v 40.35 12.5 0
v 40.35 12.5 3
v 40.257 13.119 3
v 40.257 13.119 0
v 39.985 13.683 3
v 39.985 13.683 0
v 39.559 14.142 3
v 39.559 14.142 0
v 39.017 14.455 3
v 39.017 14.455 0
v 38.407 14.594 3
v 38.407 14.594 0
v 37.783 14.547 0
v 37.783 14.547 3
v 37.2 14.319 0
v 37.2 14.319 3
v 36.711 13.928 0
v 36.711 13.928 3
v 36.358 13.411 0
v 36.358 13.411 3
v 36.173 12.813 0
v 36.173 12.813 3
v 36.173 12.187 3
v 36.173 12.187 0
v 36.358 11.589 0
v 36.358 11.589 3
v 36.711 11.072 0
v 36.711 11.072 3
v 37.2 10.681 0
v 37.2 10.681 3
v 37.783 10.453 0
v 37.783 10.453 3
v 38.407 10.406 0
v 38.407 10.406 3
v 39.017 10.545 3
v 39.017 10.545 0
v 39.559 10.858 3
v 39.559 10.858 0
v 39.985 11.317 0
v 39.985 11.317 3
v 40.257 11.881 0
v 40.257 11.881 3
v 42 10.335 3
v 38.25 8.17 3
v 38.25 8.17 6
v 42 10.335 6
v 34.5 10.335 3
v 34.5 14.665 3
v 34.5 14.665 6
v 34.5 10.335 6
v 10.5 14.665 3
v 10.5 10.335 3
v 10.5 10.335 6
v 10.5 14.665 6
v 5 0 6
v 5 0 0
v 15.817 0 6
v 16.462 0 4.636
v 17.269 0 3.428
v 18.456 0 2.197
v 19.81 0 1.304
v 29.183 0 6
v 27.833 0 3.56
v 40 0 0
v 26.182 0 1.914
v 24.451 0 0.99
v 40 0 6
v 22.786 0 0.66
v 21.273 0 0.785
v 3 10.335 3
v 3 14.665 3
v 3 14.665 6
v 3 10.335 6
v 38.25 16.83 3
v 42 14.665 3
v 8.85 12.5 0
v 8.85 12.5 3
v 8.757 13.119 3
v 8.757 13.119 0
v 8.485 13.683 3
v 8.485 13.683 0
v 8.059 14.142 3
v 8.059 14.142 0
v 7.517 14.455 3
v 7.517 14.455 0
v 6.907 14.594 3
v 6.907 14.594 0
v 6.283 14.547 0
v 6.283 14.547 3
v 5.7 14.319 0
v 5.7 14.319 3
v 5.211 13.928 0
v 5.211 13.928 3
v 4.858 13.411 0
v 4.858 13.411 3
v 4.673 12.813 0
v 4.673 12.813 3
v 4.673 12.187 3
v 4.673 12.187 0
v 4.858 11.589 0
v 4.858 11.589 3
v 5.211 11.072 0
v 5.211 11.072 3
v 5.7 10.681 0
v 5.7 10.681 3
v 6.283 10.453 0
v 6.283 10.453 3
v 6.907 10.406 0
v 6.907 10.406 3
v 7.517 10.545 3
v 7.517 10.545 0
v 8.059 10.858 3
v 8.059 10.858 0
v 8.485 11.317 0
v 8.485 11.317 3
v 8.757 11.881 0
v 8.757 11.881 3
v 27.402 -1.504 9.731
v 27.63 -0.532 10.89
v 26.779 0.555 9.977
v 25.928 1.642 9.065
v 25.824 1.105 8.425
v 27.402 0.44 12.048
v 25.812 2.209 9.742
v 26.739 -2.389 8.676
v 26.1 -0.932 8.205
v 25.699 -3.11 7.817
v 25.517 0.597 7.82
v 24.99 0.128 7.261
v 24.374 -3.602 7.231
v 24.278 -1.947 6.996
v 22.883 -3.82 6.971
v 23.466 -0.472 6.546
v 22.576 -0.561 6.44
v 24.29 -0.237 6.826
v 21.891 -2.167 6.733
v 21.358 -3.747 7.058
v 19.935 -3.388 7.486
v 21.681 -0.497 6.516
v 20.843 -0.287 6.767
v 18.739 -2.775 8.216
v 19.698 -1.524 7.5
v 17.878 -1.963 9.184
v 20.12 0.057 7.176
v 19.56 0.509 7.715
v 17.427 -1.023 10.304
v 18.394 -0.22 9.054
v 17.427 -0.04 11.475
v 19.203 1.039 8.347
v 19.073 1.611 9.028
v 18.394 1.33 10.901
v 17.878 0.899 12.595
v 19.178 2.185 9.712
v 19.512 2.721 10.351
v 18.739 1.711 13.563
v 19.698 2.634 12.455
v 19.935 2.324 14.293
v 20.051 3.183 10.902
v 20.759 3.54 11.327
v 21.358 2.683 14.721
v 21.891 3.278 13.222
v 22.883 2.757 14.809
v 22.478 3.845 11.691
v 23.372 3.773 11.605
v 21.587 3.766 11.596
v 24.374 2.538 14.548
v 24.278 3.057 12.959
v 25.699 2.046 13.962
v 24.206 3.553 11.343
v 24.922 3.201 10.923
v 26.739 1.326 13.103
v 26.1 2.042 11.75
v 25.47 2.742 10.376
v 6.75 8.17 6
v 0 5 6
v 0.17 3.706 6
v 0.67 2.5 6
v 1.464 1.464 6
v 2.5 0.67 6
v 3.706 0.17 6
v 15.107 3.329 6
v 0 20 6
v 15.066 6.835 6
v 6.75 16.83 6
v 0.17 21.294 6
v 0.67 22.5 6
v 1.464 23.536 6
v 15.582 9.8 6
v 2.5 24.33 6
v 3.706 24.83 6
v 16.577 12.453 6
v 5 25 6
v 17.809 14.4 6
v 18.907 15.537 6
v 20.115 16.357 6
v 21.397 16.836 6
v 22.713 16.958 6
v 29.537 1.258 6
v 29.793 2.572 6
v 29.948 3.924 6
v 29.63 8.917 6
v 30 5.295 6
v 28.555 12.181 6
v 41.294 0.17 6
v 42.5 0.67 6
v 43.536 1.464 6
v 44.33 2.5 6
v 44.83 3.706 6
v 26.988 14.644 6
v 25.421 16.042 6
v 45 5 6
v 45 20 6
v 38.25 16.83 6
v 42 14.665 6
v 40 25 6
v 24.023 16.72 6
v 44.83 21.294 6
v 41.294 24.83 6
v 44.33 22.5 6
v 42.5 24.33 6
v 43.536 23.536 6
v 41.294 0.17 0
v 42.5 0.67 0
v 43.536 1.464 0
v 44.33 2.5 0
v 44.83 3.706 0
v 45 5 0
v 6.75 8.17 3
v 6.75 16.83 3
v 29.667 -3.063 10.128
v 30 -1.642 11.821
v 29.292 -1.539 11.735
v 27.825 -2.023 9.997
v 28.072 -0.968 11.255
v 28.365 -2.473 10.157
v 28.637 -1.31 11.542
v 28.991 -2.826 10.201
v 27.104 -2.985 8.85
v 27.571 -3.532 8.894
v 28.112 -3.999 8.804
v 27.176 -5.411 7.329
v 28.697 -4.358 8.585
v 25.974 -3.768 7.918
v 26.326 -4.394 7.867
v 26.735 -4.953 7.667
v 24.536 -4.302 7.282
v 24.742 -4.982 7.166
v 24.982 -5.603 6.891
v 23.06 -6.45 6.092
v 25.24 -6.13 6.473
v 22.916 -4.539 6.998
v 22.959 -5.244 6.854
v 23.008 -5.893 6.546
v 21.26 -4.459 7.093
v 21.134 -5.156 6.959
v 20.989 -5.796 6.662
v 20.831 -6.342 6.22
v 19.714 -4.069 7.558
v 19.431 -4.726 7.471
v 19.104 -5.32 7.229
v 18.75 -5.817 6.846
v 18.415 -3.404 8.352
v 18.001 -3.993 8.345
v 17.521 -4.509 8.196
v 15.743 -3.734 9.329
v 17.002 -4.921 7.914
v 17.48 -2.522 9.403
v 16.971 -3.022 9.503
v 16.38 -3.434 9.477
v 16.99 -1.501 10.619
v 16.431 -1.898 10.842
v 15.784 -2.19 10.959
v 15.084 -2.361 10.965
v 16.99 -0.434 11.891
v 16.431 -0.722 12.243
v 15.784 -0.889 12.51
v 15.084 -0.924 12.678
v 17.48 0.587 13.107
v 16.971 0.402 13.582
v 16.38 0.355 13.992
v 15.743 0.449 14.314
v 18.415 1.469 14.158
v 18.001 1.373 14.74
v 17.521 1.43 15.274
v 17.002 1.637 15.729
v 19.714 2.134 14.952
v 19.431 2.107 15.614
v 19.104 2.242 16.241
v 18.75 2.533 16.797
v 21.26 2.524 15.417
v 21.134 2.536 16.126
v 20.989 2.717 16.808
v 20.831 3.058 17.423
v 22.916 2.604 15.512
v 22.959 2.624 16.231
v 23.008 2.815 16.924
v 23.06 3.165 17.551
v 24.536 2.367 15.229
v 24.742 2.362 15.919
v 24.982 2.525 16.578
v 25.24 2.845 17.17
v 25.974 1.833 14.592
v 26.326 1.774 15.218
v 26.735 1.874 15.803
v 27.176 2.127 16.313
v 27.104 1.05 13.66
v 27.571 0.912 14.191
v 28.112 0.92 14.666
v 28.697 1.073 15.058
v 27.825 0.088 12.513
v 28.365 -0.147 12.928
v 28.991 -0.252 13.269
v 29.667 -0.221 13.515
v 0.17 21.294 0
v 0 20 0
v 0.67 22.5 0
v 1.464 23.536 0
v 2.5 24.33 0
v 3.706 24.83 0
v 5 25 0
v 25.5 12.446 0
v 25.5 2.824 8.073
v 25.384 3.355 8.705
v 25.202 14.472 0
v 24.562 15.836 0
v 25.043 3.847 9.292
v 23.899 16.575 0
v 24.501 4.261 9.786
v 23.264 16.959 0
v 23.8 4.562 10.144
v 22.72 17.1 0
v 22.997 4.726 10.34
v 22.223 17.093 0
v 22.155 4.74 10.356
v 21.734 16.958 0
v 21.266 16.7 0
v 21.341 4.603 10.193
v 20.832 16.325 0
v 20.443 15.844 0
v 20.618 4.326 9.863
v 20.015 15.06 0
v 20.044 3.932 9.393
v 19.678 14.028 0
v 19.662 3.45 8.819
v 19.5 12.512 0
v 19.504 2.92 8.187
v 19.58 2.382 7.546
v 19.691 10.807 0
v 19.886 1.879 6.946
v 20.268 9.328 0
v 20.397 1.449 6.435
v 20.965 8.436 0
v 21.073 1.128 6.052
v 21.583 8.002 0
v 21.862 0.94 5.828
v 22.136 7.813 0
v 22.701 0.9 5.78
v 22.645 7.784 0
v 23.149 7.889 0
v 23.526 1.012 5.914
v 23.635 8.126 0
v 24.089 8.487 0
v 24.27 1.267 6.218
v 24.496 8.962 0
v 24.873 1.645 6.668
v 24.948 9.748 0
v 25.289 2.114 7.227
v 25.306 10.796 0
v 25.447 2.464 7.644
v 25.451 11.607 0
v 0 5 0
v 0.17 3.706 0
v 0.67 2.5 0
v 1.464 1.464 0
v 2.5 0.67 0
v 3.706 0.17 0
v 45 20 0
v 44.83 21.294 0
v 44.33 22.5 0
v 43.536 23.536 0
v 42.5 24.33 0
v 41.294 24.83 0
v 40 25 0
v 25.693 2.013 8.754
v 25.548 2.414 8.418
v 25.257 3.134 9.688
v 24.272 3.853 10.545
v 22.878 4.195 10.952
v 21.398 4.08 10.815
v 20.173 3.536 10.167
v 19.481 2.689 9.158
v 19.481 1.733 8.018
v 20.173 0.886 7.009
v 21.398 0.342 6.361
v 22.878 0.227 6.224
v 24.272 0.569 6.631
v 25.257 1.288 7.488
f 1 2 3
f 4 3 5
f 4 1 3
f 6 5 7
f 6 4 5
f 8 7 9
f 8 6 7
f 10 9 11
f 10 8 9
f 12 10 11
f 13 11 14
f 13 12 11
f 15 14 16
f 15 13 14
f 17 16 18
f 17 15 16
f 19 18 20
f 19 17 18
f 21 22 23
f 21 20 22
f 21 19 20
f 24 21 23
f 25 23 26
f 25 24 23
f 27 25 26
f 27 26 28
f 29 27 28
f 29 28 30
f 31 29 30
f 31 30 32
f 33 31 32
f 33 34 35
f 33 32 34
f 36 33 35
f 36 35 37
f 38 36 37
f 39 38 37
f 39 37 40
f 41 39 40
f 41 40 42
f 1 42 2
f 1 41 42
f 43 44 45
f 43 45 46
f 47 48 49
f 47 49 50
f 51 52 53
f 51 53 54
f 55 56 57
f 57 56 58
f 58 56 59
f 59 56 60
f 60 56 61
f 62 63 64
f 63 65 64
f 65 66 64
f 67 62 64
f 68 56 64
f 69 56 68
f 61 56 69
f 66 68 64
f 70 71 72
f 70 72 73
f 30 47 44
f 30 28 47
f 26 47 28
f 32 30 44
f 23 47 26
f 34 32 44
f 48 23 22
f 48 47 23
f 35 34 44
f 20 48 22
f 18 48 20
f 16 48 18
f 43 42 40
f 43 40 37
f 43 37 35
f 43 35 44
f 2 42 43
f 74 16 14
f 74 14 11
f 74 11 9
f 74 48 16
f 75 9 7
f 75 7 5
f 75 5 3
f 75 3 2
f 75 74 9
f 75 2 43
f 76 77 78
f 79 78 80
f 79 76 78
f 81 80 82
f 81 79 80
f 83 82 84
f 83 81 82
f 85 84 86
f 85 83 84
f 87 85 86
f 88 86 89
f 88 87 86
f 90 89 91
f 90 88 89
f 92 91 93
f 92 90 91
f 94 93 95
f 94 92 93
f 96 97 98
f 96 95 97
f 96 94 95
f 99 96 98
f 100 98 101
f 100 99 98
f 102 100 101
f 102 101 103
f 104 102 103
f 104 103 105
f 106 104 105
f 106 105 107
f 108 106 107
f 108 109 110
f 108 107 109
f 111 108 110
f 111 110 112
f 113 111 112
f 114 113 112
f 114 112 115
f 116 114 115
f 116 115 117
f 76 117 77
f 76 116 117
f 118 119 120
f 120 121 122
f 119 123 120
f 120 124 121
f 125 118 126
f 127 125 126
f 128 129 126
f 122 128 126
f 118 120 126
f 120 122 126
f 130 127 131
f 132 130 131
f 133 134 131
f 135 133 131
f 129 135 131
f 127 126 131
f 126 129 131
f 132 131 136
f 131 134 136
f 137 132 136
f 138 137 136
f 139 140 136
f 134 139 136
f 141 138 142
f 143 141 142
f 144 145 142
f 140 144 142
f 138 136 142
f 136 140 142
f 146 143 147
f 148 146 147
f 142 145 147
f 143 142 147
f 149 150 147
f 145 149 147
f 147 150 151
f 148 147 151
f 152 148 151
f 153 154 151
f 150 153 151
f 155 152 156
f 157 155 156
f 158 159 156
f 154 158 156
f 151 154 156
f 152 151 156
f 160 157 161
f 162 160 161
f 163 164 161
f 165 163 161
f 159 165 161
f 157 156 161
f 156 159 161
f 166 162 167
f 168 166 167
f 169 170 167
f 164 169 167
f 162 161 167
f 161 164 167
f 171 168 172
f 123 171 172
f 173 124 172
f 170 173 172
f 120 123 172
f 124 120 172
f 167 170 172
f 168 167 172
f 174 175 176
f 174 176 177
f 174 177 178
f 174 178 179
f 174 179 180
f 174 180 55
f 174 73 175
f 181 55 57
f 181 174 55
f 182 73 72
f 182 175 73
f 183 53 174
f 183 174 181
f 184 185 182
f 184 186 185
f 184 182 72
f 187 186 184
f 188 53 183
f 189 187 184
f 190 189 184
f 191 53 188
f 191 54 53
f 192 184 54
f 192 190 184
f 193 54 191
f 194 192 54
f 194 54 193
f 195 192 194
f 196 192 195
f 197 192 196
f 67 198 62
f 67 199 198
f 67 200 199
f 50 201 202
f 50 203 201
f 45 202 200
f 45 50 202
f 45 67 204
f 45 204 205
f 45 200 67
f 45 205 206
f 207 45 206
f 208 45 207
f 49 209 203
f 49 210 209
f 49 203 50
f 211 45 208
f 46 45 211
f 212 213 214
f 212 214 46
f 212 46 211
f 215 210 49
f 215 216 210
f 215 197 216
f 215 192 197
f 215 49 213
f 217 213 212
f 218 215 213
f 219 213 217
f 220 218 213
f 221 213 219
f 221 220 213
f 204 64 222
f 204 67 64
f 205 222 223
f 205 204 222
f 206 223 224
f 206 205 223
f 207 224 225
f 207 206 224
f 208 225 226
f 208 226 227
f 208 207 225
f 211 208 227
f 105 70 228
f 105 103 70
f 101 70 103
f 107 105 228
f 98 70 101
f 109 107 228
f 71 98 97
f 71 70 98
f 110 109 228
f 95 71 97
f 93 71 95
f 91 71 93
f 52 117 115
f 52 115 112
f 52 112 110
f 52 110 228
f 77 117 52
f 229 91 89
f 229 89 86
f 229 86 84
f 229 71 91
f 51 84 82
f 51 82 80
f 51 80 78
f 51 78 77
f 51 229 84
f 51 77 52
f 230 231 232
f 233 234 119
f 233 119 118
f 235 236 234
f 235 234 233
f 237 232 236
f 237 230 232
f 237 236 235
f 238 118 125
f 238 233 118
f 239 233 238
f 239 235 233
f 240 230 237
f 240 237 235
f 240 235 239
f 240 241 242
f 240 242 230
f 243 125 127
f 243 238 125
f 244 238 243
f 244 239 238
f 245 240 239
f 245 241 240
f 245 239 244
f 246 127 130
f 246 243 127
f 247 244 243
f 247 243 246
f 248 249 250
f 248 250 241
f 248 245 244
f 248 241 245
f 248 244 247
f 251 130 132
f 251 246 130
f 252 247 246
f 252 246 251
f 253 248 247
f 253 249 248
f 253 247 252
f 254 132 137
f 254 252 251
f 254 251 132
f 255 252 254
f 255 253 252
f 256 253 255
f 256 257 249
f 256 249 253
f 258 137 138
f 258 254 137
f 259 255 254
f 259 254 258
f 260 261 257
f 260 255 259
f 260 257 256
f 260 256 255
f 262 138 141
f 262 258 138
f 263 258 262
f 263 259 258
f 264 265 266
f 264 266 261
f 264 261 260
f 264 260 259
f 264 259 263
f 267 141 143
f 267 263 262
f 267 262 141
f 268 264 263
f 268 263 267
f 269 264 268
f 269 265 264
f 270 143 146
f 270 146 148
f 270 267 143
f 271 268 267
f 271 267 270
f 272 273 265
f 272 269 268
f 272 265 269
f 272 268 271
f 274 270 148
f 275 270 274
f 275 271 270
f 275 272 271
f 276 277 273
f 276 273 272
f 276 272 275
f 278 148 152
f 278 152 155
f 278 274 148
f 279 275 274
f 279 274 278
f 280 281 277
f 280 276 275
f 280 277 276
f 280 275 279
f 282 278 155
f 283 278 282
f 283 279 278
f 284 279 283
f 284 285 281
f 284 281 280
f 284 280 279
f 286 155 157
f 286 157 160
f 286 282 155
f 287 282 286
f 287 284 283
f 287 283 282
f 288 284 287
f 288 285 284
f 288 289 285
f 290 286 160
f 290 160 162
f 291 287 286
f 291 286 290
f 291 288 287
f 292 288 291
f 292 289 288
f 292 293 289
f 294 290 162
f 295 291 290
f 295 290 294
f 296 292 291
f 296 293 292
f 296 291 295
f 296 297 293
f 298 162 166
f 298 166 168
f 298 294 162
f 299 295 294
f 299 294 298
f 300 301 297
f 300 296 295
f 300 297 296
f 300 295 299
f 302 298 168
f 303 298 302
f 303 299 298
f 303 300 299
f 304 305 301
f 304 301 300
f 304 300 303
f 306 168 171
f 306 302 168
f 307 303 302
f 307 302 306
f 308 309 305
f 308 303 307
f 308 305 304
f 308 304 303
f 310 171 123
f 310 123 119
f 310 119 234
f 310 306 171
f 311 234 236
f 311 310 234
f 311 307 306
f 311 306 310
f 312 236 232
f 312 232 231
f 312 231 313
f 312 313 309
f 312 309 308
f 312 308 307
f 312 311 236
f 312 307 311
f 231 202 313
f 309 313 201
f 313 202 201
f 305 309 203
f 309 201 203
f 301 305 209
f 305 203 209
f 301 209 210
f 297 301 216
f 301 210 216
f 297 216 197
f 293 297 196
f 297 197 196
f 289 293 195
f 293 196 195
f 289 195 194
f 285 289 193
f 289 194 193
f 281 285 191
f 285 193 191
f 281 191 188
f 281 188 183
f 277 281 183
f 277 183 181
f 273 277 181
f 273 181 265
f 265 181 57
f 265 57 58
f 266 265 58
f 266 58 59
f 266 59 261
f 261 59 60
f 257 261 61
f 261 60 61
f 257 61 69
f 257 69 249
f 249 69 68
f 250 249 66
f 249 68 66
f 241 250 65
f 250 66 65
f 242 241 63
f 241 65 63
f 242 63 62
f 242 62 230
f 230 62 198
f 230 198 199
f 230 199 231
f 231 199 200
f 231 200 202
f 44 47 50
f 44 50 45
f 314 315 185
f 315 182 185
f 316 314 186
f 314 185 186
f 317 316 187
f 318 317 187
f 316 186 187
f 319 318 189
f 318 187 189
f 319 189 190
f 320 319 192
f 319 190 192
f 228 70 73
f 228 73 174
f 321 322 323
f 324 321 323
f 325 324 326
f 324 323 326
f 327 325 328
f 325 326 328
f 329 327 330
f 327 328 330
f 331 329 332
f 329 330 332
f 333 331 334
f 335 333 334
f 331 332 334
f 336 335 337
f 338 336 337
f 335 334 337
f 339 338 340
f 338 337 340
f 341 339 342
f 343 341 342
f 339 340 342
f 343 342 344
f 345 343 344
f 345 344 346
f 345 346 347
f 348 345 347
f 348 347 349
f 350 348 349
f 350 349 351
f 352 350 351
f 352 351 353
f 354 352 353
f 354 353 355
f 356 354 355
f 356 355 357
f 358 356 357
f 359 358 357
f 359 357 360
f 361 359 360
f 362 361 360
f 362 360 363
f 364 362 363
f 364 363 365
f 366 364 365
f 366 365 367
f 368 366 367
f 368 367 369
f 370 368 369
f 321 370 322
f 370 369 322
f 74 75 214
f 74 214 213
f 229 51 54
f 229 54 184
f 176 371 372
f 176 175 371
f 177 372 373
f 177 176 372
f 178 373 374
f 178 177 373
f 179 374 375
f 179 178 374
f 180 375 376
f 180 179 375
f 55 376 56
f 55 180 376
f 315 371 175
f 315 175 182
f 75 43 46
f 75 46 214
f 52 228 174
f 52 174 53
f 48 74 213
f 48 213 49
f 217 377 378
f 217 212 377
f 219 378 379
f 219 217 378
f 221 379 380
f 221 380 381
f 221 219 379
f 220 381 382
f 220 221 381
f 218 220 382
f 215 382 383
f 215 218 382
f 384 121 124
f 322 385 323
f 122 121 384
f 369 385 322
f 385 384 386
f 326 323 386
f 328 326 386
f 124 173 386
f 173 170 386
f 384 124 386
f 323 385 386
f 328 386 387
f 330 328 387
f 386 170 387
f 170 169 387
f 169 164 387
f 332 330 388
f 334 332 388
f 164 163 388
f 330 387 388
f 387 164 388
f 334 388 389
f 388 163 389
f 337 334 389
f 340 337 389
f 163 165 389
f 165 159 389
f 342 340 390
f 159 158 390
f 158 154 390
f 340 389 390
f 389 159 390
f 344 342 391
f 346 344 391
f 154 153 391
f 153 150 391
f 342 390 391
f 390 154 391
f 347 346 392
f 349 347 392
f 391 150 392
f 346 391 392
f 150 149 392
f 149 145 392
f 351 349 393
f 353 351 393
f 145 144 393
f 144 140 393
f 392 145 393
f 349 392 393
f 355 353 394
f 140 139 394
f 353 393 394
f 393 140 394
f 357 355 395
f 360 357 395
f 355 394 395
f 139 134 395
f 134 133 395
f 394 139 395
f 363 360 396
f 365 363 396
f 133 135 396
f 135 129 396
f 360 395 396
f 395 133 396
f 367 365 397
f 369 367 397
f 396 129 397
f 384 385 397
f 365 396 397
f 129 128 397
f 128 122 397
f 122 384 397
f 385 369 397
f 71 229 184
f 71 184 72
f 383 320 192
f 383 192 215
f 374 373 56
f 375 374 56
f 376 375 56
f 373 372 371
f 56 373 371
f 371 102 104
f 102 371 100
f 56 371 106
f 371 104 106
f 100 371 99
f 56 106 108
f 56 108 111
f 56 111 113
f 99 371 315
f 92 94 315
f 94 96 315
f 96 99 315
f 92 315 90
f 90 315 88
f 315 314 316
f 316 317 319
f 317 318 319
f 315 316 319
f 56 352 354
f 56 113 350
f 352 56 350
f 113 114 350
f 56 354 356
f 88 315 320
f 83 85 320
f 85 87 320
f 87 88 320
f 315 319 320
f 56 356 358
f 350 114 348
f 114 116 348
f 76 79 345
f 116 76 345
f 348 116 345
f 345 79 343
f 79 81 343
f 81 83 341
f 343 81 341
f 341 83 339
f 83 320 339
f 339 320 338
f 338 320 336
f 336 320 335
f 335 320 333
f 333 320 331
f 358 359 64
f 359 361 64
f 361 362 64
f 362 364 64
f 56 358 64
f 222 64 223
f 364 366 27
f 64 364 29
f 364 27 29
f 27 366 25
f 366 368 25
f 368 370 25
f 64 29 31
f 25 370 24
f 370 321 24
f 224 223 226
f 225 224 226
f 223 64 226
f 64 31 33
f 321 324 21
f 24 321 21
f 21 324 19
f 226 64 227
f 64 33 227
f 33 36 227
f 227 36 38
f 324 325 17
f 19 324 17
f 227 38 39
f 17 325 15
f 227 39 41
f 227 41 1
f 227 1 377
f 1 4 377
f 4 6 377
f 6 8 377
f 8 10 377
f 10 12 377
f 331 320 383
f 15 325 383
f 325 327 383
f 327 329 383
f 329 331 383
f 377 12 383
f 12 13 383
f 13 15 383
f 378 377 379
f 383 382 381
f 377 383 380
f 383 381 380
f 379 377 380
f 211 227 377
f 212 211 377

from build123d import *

# Parameters (mm, degrees)
F0_W           = 45
F0_H           = 25
F1_DEPTH       = 6
F2_R           = 5
F5_DEPTH       = 25
F6_R           = 2.1
F7_DEPTH       = 25
F9_R           = 7.5
F10_DEPTH      = 5
F10_DEPTH_BACK = 25
F11_W          = 49.2877000943
F11_H          = 30.2235903218
F12_DEPTH      = 25
F13_W          = 37.6632460393
F13_H          = 10.6945014559
F14_DEPTH      = 25
F15_R          = 3
F16_DEPTH      = 25
F16_DEPTH_BACK = 25
F18_R          = 3


# Not quite as in the source:
# - a fillet or chamfer that OpenCascade refuses, or shapes differently, is made with other operations: its cross-section is extruded or revolved along the edge and cut away or added


with BuildPart() as f1:
    # F0 (on Top) → F1 (new body)
    with BuildSketch(Plane.XY):
        with Locations((22.5, 12.5)):
            Rectangle(F0_W, F0_H)
    extrude(amount=F1_DEPTH)

    # F2
    f2_edges = [f1.edges().sort_by_distance(p)[0] for p in [
        (45, 25, 3),
        (45, 0, 3),
        (0, 25, 3),
        (0, 0, 3),
    ]]
    fillet(f2_edges, radius=F2_R)

    # F4 (on offset) → F5 (cut)
    with BuildSketch(Plane.XY.offset(3)):
        Polygon((3, 14.6650635095), (3, 10.3349364905), (6.75, 8.1698729811), (10.5, 10.3349364905), (10.5, 14.6650635095), (6.75, 16.8301270189), align=None)
        Polygon((42, 10.3349364905), (42, 14.6650635095), (38.25, 16.8301270189), (34.5, 14.6650635095), (34.5, 10.3349364905), (38.25, 8.1698729811), align=None)
    extrude(amount=F5_DEPTH, mode=Mode.SUBTRACT)

    # F6 (on Top) → F7 (cut)
    with BuildSketch(Plane.XY):
        with Locations((6.75, 12.5)):
            Circle(F6_R)
        with Locations((38.25, 12.5)):
            Circle(F6_R)
    extrude(amount=F7_DEPTH, mode=Mode.SUBTRACT)

    # F9 (on face) → F10 (join, two sides)
    with BuildSketch(Plane(origin=(0, -2.954423259, 2.479055467), x_dir=(1, 0, 0), z_dir=(0, -0.7660444431, 0.6427876097))) as f10_sk:
        with Locations((22.5, 8)):
            Circle(F9_R)
    extrude(amount=F10_DEPTH)
    extrude(f10_sk.sketch, amount=-F10_DEPTH_BACK)

    # F11 (on Top) → F12 (cut)
    with BuildSketch(Plane.XY):
        with Locations((22.6797270589, 13.7661970221)):
            Rectangle(F11_W, F11_H)
    extrude(amount=-F12_DEPTH, mode=Mode.SUBTRACT)

    # F13 (on face) → F14 (cut)
    with BuildSketch(Plane(origin=(0, 25, 0), x_dir=(-1, 0, 0), z_dir=(0, 1, 0))):
        with Locations((-22.6992729586, 2.3689556401)):
            Rectangle(F13_W, F13_H)
    extrude(amount=F14_DEPTH, mode=Mode.SUBTRACT)

    # F15 (on face) → F16 (cut, two sides)
    with BuildSketch(Plane(origin=(0, -2.954423259, 2.479055467), x_dir=(1, 0, 0), z_dir=(0, -0.7660444431, 0.6427876097))) as f16_sk:
        with Locations((22.5, 8)):
            Circle(F15_R)
    extrude(amount=F16_DEPTH, mode=Mode.SUBTRACT)
    extrude(f16_sk.sketch, amount=-F16_DEPTH_BACK, mode=Mode.SUBTRACT)

    # F17: chamfer of 3 x 5 on 1 edges, made by hand

    # F17_s1 → F17_t2 (revolve, cut)
    with BuildSketch(Plane(origin=(0, 5.1423008775, 6.128355545), x_dir=(1, 0, 0), z_dir=(0, 0.6427876097, 0.7660444431))):
        Polygon((28.5, -8.8567256581), (25.5, -3.8567256581), (25.5, -8.8567256581), align=None)
    revolve(axis=Axis((22.5, -1.6423445971, 11.8213490604), (0, 0.7660444431, -0.6427876097)), mode=Mode.SUBTRACT)

    # F18
    f18_edges = [f1.edges().sort_by_distance(p)[0] for p in [
        (19.5, 2.187878, 8.607411),
    ]]
    fillet(f18_edges, radius=F18_R)

    # F19: fillet of radius 3 on 1 edges, made by hand

    # F19_s1 → F19_t2 (revolve, cut)
    with BuildSketch(Plane(origin=(0, 5.1423008775, 6.128355545), x_dir=(1, 0, 0), z_dir=(0, 0.6427876097, 0.7660444431))):
        with BuildLine():
            ThreePointArc((27.6302051352, -7.4070675501), (28.6371938466, -8.4227287465), (30, -8.8567256581))
            Line((30, -8.8567256581), (28.5, -8.8567256581))
            Line((28.5, -8.8567256581), (27.6302051352, -7.4070675501))
        make_face()
    revolve(axis=Axis((22.5, -1.6423445971, 11.8213490604), (0, 0.7660444431, -0.6427876097)), mode=Mode.SUBTRACT)


solid = f1.part
